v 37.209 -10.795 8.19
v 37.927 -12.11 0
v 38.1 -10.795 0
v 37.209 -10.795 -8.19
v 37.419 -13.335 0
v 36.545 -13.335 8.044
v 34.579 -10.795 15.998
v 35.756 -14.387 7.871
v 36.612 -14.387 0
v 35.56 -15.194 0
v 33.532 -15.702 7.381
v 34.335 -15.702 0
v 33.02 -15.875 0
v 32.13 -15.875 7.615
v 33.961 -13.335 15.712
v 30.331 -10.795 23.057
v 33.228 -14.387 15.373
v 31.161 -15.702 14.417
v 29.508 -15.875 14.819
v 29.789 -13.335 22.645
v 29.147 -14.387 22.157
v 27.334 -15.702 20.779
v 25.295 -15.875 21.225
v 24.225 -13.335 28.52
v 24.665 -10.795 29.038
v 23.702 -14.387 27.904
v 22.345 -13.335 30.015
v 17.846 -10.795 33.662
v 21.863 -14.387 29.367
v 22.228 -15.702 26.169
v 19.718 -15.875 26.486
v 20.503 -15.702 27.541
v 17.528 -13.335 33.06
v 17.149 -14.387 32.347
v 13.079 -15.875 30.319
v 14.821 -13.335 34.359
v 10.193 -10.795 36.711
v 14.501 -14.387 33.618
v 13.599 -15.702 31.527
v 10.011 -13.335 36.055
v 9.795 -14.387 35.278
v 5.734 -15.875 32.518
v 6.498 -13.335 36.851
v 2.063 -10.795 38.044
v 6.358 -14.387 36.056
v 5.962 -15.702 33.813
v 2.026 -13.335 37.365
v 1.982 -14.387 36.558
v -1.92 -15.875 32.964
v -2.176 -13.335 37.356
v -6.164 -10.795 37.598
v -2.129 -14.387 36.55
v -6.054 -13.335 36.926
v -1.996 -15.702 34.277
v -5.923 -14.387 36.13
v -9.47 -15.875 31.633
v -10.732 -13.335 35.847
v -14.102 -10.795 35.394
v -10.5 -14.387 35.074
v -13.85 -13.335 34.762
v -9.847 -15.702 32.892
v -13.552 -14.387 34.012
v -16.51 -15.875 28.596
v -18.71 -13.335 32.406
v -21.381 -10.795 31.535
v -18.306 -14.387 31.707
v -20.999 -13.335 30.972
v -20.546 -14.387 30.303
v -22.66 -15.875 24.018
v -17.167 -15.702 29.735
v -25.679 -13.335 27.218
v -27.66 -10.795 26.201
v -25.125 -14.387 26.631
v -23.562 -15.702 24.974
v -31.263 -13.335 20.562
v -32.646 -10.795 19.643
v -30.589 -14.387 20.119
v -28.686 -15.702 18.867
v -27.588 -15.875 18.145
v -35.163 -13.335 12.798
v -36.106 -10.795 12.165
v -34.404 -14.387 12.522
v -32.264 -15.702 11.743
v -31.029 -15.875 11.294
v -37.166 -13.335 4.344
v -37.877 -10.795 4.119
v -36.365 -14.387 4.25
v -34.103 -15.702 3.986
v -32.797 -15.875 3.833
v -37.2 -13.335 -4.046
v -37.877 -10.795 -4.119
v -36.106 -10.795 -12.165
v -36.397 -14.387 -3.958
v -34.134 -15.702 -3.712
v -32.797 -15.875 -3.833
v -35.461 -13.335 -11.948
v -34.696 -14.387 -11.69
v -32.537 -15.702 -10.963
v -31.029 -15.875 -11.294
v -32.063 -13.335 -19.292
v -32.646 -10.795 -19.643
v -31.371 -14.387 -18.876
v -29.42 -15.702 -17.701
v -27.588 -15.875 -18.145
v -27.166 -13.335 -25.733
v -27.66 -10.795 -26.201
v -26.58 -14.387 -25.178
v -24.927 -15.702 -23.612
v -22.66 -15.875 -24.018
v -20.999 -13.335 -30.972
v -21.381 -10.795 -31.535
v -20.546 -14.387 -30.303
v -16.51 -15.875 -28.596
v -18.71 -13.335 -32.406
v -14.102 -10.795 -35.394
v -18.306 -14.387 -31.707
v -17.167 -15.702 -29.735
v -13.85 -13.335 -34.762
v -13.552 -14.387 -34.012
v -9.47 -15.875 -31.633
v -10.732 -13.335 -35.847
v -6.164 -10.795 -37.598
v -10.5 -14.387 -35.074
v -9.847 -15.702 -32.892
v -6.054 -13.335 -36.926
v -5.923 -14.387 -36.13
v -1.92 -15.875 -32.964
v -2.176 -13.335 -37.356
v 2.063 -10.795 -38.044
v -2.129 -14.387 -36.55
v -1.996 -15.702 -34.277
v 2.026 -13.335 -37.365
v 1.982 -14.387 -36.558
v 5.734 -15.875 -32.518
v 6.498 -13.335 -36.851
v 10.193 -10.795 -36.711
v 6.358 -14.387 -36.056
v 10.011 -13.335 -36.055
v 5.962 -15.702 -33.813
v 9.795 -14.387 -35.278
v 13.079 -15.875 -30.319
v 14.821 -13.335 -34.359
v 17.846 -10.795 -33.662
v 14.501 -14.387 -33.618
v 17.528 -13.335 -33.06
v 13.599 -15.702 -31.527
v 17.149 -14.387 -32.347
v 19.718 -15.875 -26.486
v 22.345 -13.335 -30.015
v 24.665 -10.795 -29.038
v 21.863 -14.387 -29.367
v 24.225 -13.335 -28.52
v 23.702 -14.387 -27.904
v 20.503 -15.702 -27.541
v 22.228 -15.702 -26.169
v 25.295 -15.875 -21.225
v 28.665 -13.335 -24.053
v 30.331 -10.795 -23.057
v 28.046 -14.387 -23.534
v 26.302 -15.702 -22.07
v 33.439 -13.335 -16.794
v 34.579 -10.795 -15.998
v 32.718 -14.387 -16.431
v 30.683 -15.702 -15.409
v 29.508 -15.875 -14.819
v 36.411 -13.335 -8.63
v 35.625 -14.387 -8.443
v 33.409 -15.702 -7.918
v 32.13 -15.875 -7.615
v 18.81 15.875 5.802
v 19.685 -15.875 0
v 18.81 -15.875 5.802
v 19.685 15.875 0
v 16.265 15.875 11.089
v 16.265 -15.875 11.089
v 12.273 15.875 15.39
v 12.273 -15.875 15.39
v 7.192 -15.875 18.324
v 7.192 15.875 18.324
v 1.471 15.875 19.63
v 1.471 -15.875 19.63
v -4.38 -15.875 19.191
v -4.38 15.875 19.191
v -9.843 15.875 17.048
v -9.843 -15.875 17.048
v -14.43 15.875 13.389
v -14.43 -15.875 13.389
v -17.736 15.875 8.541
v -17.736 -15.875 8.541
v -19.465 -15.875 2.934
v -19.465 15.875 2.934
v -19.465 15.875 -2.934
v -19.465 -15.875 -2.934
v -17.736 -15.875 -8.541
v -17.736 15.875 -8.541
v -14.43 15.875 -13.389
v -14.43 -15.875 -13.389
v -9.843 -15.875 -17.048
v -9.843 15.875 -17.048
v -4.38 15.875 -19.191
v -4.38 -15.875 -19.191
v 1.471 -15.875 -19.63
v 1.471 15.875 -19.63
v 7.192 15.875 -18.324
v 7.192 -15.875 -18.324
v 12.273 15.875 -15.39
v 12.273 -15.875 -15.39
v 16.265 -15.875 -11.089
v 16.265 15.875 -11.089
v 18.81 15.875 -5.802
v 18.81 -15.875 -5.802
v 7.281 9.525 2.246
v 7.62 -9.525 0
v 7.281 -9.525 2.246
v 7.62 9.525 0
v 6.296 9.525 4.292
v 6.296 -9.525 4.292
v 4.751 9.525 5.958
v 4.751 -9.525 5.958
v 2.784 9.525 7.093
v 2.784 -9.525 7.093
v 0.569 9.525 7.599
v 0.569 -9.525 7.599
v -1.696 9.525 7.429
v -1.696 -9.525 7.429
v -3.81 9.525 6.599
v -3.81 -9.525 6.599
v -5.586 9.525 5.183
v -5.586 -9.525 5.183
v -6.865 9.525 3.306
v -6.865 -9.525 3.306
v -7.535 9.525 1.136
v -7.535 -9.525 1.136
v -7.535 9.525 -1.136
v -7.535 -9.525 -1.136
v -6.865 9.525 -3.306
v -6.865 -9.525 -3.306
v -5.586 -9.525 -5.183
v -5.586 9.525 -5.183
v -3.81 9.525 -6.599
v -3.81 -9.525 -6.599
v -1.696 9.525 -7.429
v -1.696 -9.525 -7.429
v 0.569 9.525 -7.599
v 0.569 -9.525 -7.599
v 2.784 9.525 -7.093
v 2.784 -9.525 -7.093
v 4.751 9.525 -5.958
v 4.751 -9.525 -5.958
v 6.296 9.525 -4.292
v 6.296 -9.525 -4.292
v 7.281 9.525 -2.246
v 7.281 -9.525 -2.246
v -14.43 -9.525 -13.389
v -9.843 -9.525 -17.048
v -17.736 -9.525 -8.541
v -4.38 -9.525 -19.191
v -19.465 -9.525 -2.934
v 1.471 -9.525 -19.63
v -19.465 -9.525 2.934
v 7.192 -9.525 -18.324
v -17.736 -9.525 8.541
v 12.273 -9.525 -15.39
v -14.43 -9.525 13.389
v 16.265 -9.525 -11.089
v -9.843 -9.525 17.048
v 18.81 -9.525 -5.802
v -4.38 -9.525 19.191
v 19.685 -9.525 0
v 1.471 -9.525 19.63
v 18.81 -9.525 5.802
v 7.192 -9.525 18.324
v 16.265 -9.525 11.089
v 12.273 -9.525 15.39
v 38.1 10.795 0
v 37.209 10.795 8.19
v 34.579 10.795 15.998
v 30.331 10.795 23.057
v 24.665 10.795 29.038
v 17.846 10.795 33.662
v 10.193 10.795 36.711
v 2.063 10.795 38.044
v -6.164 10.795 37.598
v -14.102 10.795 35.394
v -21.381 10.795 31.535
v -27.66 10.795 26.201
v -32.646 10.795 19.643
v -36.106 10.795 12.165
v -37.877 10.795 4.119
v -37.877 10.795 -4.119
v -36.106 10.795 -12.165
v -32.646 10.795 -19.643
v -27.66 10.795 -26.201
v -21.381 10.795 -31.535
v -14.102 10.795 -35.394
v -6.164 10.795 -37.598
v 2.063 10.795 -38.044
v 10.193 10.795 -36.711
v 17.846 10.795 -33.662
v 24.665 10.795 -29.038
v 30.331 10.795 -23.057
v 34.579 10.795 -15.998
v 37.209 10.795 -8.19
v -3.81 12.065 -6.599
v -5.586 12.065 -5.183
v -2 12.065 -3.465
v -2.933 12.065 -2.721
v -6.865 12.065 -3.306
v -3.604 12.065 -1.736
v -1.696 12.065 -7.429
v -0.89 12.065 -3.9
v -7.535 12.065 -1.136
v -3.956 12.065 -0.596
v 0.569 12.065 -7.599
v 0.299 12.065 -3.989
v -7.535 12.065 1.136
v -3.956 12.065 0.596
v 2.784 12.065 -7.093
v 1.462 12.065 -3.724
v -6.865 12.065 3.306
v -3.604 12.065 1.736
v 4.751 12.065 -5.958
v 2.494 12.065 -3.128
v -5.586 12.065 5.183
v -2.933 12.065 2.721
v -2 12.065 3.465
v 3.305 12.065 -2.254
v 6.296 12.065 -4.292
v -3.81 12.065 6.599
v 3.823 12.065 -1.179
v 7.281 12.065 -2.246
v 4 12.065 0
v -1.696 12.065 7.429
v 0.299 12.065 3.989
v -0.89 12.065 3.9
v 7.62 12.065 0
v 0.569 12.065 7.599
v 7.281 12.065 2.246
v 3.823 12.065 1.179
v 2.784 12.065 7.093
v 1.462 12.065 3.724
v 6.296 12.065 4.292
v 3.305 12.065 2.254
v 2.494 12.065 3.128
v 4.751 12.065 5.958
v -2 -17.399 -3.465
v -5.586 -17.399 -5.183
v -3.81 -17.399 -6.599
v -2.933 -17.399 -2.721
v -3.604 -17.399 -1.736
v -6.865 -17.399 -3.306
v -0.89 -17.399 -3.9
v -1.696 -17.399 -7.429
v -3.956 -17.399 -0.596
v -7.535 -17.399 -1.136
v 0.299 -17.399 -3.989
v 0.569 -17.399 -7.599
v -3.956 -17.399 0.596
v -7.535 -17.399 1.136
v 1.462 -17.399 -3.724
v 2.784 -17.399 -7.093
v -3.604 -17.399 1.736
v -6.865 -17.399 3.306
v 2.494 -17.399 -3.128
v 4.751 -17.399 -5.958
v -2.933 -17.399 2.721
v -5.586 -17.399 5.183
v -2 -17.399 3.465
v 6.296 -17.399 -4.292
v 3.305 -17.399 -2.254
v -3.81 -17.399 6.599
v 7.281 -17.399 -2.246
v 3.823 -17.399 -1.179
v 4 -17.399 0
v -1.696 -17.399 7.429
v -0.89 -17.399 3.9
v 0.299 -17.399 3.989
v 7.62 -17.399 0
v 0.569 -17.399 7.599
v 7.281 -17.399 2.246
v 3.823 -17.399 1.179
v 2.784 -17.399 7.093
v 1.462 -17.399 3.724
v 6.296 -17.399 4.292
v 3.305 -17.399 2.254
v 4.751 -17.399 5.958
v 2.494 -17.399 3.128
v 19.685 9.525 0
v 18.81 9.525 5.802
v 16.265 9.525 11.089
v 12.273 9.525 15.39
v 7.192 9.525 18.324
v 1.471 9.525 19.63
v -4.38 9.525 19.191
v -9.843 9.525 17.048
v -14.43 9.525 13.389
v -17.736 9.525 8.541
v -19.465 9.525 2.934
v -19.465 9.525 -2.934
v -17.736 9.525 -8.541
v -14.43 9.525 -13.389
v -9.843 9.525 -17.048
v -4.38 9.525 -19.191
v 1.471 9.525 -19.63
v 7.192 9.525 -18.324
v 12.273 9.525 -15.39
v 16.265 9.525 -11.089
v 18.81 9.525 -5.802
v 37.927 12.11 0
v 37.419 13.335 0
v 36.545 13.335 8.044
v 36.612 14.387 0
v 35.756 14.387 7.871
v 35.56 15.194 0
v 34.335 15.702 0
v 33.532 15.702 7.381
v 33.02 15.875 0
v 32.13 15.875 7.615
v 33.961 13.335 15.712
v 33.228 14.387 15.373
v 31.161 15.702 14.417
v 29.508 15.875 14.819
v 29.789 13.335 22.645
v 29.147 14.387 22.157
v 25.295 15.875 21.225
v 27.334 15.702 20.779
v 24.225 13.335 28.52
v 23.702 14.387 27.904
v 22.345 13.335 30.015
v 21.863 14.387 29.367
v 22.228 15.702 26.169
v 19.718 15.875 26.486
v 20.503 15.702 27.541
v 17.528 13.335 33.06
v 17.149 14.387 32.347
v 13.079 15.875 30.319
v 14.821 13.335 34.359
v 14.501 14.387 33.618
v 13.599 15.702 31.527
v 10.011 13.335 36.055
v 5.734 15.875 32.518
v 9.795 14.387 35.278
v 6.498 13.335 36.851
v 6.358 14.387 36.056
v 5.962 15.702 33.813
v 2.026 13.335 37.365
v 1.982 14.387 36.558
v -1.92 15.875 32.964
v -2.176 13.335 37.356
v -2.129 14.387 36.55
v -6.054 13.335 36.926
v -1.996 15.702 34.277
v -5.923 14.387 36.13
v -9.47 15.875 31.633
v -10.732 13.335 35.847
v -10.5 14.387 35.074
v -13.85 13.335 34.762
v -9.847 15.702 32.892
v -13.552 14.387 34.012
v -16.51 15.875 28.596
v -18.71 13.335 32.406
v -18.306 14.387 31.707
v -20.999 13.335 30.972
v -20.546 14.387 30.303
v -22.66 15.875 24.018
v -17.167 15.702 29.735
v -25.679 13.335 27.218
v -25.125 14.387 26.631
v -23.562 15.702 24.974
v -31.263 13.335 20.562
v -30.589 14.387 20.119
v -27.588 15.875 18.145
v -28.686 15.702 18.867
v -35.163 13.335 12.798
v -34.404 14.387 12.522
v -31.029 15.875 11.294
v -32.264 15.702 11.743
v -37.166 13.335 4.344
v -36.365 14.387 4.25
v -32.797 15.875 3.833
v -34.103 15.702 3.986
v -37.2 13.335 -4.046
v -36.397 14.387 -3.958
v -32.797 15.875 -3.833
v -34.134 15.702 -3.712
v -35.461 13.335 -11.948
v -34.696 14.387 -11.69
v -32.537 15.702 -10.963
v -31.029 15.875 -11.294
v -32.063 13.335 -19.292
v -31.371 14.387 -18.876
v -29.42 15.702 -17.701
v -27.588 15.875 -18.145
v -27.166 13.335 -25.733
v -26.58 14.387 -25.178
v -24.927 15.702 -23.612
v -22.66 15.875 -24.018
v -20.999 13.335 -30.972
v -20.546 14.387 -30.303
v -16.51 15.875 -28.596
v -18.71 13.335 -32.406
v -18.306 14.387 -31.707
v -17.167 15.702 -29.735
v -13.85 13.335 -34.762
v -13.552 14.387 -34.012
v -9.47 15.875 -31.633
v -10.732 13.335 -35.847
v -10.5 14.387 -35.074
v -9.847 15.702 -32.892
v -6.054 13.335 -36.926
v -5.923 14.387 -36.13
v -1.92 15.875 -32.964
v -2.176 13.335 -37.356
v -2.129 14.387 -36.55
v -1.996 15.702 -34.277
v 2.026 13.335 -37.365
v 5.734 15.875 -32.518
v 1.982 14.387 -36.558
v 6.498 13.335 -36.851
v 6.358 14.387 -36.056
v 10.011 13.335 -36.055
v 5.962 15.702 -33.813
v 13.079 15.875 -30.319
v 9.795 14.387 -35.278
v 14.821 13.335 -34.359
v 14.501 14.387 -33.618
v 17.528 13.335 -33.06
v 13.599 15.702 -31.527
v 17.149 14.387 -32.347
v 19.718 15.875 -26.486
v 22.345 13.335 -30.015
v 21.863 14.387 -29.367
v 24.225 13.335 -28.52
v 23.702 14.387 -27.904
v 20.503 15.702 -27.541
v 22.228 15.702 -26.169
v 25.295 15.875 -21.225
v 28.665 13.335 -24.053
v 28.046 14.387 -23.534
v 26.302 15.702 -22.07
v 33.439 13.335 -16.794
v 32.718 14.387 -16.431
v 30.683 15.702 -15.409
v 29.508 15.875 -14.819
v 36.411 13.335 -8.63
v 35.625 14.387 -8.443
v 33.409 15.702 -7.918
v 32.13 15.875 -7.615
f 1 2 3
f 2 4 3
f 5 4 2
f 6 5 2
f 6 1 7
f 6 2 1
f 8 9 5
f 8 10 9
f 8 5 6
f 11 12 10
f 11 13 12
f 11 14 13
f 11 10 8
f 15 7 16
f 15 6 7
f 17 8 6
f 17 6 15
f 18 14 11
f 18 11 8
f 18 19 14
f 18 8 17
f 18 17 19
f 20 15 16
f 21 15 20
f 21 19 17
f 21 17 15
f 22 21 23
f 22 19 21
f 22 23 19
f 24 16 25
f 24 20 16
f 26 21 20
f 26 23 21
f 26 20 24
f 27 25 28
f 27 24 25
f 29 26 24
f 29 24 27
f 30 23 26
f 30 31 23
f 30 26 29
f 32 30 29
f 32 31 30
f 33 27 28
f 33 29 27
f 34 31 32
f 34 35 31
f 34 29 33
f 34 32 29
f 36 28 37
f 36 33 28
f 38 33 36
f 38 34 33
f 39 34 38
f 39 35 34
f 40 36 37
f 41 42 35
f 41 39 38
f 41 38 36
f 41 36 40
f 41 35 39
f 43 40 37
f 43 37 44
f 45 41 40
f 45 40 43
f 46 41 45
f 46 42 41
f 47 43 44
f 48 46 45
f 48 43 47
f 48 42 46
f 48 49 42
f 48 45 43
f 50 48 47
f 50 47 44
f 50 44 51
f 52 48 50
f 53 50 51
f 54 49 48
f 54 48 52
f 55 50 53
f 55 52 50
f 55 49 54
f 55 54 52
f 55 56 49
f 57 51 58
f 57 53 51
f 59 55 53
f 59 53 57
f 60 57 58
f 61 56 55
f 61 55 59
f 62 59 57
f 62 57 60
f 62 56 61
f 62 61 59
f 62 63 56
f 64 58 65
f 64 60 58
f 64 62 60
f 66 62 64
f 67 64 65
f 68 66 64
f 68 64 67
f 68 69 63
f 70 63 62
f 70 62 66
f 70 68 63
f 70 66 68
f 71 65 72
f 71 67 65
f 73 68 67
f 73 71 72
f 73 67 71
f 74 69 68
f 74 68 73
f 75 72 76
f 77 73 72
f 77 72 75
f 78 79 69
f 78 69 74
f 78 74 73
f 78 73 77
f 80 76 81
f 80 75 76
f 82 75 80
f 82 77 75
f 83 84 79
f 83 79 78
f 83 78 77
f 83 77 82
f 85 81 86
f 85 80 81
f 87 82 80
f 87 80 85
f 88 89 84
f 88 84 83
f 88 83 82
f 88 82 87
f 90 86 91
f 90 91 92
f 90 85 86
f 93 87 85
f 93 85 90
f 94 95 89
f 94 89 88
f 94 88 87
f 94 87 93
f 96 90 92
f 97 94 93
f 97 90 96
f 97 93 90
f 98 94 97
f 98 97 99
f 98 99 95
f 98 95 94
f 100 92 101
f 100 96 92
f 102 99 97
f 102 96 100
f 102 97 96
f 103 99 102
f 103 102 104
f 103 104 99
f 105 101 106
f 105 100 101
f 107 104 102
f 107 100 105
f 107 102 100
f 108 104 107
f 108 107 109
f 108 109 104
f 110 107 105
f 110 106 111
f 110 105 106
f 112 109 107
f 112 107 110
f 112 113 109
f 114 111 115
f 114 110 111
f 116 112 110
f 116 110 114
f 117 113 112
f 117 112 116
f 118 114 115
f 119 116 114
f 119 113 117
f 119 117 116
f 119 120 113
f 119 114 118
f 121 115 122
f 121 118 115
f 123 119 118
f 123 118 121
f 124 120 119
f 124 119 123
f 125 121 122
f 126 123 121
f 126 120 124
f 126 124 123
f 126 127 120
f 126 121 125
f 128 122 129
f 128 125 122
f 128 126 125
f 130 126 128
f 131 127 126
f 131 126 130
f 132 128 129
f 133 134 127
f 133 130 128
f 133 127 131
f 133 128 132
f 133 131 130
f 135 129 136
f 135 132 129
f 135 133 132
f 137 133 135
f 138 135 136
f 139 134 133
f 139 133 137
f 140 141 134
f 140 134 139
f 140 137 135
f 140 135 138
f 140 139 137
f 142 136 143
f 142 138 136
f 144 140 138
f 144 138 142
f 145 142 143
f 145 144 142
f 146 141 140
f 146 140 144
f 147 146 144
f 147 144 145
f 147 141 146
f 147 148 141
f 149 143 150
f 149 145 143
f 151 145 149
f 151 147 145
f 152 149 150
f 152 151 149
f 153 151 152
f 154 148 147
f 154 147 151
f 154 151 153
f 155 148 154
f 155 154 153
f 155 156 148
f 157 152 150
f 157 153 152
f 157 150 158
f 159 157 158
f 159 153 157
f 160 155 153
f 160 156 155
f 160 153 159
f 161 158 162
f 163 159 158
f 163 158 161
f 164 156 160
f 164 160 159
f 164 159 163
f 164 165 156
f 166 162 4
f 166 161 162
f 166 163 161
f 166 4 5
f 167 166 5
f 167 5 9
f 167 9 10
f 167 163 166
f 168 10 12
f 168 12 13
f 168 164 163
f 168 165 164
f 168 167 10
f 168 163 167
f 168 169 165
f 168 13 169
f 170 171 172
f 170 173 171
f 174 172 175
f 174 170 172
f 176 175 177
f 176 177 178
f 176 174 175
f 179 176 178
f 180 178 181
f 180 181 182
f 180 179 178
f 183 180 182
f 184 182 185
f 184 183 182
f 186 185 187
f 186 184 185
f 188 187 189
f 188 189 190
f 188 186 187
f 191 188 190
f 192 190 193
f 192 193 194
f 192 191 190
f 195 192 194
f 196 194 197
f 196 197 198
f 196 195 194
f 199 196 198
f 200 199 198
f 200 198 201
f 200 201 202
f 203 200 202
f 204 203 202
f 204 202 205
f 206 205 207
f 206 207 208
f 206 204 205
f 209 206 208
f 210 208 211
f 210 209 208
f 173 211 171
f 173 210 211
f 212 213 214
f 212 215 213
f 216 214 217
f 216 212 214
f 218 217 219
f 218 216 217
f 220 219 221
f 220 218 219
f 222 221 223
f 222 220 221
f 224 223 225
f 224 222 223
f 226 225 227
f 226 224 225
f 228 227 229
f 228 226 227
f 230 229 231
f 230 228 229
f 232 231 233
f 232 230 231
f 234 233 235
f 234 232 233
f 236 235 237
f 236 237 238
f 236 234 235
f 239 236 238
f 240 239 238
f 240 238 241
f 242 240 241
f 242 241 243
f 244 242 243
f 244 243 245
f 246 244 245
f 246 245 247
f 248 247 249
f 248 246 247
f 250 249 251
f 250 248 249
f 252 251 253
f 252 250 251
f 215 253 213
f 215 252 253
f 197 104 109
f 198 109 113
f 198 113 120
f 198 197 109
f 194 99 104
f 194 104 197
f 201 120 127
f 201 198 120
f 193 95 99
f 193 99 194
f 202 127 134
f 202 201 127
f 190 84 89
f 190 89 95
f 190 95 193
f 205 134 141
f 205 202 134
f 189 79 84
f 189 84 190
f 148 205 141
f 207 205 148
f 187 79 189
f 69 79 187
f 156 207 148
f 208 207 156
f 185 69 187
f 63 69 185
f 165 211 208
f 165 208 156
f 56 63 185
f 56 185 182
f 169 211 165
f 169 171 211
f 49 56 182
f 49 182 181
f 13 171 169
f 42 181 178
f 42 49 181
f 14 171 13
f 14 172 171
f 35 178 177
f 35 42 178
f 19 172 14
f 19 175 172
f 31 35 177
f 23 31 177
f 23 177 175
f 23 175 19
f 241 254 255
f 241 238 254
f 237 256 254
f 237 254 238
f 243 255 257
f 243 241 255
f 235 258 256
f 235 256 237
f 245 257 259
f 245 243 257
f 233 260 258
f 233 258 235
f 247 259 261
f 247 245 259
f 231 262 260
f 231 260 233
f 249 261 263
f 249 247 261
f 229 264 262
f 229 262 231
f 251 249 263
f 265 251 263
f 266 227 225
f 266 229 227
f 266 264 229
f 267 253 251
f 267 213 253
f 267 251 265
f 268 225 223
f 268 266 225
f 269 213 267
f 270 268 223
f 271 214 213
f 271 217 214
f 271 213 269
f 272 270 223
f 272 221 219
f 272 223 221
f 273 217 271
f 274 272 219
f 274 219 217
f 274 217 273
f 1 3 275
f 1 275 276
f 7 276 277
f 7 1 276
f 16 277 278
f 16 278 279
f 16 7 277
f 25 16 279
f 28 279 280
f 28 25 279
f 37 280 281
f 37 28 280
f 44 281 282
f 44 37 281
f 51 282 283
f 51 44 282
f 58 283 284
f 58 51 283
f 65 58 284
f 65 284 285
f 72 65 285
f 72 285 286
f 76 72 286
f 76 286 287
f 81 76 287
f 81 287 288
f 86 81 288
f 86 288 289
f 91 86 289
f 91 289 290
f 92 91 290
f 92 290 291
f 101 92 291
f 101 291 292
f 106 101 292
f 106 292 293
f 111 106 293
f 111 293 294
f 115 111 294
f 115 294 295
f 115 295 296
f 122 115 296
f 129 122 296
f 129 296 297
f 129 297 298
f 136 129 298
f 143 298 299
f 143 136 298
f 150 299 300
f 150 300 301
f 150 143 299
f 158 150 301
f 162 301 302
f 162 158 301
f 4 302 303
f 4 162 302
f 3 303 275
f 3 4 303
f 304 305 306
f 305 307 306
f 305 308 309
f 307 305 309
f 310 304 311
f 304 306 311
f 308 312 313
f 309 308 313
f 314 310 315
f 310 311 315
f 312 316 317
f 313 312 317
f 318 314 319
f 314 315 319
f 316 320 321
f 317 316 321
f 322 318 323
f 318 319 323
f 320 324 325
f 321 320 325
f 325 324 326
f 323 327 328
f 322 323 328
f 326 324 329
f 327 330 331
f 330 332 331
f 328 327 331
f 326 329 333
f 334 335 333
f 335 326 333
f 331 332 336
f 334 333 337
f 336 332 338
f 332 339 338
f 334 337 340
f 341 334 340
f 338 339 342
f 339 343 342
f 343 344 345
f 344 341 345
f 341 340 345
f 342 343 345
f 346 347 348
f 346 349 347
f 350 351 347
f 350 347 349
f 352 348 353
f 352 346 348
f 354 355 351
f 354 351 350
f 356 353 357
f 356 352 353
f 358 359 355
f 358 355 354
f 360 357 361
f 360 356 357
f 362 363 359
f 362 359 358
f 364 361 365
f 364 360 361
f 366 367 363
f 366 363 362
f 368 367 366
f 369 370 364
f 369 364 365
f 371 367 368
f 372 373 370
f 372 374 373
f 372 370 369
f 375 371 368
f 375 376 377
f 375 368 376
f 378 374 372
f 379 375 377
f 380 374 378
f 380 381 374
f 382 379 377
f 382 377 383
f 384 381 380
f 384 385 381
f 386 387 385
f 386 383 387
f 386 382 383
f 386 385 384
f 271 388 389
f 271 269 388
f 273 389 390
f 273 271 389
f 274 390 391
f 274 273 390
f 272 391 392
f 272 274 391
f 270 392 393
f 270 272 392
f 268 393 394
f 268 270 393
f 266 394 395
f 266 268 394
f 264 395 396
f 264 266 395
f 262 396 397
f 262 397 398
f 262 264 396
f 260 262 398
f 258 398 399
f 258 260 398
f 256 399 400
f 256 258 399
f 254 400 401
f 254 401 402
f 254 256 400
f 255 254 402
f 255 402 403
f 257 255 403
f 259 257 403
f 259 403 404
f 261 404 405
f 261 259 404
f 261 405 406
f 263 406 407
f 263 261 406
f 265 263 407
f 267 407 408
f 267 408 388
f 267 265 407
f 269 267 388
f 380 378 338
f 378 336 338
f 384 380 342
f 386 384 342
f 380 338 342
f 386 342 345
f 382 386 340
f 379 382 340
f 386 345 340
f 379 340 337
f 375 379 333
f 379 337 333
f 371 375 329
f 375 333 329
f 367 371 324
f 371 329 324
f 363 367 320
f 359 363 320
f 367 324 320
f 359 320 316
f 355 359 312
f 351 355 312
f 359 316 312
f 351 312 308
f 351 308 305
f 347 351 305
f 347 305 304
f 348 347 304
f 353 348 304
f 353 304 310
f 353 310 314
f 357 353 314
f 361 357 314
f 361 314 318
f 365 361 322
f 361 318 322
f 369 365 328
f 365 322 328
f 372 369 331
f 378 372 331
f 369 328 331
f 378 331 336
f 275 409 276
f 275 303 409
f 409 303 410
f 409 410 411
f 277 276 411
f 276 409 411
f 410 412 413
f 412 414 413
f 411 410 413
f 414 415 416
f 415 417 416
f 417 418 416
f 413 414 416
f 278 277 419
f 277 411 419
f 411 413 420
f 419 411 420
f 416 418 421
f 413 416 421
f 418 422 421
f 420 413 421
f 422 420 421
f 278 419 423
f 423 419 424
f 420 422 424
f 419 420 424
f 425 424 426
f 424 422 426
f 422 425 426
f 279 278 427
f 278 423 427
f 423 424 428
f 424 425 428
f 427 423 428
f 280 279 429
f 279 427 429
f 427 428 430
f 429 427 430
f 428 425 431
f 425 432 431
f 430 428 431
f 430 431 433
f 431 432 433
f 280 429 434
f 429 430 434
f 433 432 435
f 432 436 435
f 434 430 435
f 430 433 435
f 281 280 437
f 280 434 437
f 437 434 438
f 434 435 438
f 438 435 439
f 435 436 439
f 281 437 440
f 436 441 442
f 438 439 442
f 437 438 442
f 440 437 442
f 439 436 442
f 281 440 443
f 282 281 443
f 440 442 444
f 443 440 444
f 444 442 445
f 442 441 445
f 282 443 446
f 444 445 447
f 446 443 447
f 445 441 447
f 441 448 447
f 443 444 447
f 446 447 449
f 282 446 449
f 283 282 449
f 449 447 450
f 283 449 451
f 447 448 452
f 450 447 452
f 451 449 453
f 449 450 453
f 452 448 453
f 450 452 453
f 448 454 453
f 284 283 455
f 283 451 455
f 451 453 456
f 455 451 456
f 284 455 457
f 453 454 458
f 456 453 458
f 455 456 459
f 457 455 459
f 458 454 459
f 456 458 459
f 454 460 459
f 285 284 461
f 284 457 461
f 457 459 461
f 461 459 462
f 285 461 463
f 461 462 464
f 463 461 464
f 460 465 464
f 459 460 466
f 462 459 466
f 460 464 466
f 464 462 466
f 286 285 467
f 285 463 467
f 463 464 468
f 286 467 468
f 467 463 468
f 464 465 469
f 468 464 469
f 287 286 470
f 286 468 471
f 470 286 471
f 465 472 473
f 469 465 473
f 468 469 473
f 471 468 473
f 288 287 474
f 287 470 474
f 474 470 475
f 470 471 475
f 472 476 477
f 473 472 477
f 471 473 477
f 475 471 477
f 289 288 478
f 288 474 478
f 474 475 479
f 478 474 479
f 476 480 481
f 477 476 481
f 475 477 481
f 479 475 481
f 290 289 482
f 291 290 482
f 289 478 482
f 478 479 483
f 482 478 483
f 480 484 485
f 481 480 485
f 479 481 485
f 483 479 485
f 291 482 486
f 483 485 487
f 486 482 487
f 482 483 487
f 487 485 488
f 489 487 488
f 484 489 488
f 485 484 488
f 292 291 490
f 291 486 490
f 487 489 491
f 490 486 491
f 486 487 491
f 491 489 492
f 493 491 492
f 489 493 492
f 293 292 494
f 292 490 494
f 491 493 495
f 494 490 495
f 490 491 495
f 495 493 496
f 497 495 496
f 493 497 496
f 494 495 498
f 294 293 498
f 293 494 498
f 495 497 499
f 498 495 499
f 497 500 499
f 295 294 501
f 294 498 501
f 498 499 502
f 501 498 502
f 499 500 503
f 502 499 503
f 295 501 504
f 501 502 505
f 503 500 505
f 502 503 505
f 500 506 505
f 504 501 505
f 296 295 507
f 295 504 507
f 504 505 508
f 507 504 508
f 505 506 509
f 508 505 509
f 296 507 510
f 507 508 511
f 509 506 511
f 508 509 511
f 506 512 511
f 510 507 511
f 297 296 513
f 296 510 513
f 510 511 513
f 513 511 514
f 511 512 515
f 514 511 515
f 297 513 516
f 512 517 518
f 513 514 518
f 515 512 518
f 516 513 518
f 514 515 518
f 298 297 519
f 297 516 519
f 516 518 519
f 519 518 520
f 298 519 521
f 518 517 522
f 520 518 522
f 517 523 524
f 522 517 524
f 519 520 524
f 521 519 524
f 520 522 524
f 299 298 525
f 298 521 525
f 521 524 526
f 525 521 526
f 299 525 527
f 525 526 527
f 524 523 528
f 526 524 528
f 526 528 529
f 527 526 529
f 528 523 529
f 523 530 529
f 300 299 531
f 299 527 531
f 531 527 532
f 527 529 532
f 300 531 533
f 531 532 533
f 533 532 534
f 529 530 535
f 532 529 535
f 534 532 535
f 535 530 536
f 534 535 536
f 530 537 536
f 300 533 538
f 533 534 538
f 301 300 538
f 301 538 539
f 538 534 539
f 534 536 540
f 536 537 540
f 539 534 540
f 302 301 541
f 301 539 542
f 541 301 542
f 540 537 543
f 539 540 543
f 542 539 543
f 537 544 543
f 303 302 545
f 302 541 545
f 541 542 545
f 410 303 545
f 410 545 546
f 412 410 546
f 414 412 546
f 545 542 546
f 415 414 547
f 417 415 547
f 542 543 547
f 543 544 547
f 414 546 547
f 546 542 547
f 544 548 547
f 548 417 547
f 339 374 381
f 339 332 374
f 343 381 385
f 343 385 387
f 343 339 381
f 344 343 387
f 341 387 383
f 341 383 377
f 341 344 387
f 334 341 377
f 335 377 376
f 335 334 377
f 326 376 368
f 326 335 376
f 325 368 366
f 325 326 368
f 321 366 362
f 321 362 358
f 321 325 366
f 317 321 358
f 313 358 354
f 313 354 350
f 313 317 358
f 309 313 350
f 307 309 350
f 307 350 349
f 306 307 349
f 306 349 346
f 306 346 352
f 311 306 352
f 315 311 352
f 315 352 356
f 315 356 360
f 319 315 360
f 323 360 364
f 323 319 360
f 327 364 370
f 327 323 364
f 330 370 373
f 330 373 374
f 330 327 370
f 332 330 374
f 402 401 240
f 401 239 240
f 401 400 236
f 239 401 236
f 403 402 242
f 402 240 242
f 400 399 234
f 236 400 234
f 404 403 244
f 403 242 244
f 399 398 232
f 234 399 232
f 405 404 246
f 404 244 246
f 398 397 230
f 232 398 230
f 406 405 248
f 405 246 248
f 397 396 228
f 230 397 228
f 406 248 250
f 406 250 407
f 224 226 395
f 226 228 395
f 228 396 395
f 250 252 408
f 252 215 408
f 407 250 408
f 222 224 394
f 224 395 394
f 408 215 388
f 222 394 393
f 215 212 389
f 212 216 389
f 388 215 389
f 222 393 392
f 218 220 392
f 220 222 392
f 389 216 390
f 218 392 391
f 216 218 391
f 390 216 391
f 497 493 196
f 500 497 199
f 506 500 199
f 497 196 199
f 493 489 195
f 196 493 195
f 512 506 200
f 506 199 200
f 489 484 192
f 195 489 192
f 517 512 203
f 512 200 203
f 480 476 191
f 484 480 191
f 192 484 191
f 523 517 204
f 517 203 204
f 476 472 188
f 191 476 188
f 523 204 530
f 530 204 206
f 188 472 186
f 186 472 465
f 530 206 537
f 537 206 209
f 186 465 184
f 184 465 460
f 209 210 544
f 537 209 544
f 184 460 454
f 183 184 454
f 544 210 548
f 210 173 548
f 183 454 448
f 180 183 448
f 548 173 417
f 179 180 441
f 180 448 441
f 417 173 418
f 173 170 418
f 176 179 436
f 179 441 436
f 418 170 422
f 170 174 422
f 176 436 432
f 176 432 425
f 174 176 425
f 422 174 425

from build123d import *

# Parameters (mm, degrees)
F0_R     = 38.1
F0_R_2   = 19.685
F1_DEPTH = 15.875
F0_R_3   = 7.62
F0_R_4   = 4.0005
F2_DEPTH = 12.065
F0_R_5   = 8.89
F3_DEPTH = 9.525
F4_R     = 7.62
F4_R_2   = 4.0005
F5_DEPTH = 5.334
F6_R     = 5.08


with BuildPart() as f1:
    # F0 (on Front) → F1 (new body, symmetric)
    with BuildSketch(Plane.XZ):
        Circle(F0_R)
        Circle(F0_R_2, mode=Mode.SUBTRACT)
    extrude(amount=F1_DEPTH, both=True)

    # F6
    f6_edges = [f1.edges().sort_by_distance(p)[0] for p in [
        (-38.1, -15.875, 0),
        (-38.1, 15.875, 0),
    ]]
    fillet(f6_edges, radius=F6_R)


with BuildPart() as f2:
    # F0 (on Front) → F2 (new body, symmetric)
    with BuildSketch(Plane.XZ):
        Circle(F0_R_3)
        Circle(F0_R_4, mode=Mode.SUBTRACT)
    extrude(amount=F2_DEPTH, both=True)

    # F4 (on face) → F5 (join)
    with BuildSketch(Plane.XZ.offset(12.065)):
        Circle(F4_R)
        Circle(F4_R_2, mode=Mode.SUBTRACT)
    extrude(amount=F5_DEPTH)


with BuildPart() as f3:
    # F0 (on Front) → F3 (new body, symmetric)
    with BuildSketch(Plane.XZ):
        Circle(F0_R_2)
        Circle(F0_R_5, mode=Mode.SUBTRACT)
        Circle(F0_R_5)
        Circle(F0_R_3, mode=Mode.SUBTRACT)
    extrude(amount=F3_DEPTH, both=True)


solid = Compound([f1.part, f2.part, f3.part])
